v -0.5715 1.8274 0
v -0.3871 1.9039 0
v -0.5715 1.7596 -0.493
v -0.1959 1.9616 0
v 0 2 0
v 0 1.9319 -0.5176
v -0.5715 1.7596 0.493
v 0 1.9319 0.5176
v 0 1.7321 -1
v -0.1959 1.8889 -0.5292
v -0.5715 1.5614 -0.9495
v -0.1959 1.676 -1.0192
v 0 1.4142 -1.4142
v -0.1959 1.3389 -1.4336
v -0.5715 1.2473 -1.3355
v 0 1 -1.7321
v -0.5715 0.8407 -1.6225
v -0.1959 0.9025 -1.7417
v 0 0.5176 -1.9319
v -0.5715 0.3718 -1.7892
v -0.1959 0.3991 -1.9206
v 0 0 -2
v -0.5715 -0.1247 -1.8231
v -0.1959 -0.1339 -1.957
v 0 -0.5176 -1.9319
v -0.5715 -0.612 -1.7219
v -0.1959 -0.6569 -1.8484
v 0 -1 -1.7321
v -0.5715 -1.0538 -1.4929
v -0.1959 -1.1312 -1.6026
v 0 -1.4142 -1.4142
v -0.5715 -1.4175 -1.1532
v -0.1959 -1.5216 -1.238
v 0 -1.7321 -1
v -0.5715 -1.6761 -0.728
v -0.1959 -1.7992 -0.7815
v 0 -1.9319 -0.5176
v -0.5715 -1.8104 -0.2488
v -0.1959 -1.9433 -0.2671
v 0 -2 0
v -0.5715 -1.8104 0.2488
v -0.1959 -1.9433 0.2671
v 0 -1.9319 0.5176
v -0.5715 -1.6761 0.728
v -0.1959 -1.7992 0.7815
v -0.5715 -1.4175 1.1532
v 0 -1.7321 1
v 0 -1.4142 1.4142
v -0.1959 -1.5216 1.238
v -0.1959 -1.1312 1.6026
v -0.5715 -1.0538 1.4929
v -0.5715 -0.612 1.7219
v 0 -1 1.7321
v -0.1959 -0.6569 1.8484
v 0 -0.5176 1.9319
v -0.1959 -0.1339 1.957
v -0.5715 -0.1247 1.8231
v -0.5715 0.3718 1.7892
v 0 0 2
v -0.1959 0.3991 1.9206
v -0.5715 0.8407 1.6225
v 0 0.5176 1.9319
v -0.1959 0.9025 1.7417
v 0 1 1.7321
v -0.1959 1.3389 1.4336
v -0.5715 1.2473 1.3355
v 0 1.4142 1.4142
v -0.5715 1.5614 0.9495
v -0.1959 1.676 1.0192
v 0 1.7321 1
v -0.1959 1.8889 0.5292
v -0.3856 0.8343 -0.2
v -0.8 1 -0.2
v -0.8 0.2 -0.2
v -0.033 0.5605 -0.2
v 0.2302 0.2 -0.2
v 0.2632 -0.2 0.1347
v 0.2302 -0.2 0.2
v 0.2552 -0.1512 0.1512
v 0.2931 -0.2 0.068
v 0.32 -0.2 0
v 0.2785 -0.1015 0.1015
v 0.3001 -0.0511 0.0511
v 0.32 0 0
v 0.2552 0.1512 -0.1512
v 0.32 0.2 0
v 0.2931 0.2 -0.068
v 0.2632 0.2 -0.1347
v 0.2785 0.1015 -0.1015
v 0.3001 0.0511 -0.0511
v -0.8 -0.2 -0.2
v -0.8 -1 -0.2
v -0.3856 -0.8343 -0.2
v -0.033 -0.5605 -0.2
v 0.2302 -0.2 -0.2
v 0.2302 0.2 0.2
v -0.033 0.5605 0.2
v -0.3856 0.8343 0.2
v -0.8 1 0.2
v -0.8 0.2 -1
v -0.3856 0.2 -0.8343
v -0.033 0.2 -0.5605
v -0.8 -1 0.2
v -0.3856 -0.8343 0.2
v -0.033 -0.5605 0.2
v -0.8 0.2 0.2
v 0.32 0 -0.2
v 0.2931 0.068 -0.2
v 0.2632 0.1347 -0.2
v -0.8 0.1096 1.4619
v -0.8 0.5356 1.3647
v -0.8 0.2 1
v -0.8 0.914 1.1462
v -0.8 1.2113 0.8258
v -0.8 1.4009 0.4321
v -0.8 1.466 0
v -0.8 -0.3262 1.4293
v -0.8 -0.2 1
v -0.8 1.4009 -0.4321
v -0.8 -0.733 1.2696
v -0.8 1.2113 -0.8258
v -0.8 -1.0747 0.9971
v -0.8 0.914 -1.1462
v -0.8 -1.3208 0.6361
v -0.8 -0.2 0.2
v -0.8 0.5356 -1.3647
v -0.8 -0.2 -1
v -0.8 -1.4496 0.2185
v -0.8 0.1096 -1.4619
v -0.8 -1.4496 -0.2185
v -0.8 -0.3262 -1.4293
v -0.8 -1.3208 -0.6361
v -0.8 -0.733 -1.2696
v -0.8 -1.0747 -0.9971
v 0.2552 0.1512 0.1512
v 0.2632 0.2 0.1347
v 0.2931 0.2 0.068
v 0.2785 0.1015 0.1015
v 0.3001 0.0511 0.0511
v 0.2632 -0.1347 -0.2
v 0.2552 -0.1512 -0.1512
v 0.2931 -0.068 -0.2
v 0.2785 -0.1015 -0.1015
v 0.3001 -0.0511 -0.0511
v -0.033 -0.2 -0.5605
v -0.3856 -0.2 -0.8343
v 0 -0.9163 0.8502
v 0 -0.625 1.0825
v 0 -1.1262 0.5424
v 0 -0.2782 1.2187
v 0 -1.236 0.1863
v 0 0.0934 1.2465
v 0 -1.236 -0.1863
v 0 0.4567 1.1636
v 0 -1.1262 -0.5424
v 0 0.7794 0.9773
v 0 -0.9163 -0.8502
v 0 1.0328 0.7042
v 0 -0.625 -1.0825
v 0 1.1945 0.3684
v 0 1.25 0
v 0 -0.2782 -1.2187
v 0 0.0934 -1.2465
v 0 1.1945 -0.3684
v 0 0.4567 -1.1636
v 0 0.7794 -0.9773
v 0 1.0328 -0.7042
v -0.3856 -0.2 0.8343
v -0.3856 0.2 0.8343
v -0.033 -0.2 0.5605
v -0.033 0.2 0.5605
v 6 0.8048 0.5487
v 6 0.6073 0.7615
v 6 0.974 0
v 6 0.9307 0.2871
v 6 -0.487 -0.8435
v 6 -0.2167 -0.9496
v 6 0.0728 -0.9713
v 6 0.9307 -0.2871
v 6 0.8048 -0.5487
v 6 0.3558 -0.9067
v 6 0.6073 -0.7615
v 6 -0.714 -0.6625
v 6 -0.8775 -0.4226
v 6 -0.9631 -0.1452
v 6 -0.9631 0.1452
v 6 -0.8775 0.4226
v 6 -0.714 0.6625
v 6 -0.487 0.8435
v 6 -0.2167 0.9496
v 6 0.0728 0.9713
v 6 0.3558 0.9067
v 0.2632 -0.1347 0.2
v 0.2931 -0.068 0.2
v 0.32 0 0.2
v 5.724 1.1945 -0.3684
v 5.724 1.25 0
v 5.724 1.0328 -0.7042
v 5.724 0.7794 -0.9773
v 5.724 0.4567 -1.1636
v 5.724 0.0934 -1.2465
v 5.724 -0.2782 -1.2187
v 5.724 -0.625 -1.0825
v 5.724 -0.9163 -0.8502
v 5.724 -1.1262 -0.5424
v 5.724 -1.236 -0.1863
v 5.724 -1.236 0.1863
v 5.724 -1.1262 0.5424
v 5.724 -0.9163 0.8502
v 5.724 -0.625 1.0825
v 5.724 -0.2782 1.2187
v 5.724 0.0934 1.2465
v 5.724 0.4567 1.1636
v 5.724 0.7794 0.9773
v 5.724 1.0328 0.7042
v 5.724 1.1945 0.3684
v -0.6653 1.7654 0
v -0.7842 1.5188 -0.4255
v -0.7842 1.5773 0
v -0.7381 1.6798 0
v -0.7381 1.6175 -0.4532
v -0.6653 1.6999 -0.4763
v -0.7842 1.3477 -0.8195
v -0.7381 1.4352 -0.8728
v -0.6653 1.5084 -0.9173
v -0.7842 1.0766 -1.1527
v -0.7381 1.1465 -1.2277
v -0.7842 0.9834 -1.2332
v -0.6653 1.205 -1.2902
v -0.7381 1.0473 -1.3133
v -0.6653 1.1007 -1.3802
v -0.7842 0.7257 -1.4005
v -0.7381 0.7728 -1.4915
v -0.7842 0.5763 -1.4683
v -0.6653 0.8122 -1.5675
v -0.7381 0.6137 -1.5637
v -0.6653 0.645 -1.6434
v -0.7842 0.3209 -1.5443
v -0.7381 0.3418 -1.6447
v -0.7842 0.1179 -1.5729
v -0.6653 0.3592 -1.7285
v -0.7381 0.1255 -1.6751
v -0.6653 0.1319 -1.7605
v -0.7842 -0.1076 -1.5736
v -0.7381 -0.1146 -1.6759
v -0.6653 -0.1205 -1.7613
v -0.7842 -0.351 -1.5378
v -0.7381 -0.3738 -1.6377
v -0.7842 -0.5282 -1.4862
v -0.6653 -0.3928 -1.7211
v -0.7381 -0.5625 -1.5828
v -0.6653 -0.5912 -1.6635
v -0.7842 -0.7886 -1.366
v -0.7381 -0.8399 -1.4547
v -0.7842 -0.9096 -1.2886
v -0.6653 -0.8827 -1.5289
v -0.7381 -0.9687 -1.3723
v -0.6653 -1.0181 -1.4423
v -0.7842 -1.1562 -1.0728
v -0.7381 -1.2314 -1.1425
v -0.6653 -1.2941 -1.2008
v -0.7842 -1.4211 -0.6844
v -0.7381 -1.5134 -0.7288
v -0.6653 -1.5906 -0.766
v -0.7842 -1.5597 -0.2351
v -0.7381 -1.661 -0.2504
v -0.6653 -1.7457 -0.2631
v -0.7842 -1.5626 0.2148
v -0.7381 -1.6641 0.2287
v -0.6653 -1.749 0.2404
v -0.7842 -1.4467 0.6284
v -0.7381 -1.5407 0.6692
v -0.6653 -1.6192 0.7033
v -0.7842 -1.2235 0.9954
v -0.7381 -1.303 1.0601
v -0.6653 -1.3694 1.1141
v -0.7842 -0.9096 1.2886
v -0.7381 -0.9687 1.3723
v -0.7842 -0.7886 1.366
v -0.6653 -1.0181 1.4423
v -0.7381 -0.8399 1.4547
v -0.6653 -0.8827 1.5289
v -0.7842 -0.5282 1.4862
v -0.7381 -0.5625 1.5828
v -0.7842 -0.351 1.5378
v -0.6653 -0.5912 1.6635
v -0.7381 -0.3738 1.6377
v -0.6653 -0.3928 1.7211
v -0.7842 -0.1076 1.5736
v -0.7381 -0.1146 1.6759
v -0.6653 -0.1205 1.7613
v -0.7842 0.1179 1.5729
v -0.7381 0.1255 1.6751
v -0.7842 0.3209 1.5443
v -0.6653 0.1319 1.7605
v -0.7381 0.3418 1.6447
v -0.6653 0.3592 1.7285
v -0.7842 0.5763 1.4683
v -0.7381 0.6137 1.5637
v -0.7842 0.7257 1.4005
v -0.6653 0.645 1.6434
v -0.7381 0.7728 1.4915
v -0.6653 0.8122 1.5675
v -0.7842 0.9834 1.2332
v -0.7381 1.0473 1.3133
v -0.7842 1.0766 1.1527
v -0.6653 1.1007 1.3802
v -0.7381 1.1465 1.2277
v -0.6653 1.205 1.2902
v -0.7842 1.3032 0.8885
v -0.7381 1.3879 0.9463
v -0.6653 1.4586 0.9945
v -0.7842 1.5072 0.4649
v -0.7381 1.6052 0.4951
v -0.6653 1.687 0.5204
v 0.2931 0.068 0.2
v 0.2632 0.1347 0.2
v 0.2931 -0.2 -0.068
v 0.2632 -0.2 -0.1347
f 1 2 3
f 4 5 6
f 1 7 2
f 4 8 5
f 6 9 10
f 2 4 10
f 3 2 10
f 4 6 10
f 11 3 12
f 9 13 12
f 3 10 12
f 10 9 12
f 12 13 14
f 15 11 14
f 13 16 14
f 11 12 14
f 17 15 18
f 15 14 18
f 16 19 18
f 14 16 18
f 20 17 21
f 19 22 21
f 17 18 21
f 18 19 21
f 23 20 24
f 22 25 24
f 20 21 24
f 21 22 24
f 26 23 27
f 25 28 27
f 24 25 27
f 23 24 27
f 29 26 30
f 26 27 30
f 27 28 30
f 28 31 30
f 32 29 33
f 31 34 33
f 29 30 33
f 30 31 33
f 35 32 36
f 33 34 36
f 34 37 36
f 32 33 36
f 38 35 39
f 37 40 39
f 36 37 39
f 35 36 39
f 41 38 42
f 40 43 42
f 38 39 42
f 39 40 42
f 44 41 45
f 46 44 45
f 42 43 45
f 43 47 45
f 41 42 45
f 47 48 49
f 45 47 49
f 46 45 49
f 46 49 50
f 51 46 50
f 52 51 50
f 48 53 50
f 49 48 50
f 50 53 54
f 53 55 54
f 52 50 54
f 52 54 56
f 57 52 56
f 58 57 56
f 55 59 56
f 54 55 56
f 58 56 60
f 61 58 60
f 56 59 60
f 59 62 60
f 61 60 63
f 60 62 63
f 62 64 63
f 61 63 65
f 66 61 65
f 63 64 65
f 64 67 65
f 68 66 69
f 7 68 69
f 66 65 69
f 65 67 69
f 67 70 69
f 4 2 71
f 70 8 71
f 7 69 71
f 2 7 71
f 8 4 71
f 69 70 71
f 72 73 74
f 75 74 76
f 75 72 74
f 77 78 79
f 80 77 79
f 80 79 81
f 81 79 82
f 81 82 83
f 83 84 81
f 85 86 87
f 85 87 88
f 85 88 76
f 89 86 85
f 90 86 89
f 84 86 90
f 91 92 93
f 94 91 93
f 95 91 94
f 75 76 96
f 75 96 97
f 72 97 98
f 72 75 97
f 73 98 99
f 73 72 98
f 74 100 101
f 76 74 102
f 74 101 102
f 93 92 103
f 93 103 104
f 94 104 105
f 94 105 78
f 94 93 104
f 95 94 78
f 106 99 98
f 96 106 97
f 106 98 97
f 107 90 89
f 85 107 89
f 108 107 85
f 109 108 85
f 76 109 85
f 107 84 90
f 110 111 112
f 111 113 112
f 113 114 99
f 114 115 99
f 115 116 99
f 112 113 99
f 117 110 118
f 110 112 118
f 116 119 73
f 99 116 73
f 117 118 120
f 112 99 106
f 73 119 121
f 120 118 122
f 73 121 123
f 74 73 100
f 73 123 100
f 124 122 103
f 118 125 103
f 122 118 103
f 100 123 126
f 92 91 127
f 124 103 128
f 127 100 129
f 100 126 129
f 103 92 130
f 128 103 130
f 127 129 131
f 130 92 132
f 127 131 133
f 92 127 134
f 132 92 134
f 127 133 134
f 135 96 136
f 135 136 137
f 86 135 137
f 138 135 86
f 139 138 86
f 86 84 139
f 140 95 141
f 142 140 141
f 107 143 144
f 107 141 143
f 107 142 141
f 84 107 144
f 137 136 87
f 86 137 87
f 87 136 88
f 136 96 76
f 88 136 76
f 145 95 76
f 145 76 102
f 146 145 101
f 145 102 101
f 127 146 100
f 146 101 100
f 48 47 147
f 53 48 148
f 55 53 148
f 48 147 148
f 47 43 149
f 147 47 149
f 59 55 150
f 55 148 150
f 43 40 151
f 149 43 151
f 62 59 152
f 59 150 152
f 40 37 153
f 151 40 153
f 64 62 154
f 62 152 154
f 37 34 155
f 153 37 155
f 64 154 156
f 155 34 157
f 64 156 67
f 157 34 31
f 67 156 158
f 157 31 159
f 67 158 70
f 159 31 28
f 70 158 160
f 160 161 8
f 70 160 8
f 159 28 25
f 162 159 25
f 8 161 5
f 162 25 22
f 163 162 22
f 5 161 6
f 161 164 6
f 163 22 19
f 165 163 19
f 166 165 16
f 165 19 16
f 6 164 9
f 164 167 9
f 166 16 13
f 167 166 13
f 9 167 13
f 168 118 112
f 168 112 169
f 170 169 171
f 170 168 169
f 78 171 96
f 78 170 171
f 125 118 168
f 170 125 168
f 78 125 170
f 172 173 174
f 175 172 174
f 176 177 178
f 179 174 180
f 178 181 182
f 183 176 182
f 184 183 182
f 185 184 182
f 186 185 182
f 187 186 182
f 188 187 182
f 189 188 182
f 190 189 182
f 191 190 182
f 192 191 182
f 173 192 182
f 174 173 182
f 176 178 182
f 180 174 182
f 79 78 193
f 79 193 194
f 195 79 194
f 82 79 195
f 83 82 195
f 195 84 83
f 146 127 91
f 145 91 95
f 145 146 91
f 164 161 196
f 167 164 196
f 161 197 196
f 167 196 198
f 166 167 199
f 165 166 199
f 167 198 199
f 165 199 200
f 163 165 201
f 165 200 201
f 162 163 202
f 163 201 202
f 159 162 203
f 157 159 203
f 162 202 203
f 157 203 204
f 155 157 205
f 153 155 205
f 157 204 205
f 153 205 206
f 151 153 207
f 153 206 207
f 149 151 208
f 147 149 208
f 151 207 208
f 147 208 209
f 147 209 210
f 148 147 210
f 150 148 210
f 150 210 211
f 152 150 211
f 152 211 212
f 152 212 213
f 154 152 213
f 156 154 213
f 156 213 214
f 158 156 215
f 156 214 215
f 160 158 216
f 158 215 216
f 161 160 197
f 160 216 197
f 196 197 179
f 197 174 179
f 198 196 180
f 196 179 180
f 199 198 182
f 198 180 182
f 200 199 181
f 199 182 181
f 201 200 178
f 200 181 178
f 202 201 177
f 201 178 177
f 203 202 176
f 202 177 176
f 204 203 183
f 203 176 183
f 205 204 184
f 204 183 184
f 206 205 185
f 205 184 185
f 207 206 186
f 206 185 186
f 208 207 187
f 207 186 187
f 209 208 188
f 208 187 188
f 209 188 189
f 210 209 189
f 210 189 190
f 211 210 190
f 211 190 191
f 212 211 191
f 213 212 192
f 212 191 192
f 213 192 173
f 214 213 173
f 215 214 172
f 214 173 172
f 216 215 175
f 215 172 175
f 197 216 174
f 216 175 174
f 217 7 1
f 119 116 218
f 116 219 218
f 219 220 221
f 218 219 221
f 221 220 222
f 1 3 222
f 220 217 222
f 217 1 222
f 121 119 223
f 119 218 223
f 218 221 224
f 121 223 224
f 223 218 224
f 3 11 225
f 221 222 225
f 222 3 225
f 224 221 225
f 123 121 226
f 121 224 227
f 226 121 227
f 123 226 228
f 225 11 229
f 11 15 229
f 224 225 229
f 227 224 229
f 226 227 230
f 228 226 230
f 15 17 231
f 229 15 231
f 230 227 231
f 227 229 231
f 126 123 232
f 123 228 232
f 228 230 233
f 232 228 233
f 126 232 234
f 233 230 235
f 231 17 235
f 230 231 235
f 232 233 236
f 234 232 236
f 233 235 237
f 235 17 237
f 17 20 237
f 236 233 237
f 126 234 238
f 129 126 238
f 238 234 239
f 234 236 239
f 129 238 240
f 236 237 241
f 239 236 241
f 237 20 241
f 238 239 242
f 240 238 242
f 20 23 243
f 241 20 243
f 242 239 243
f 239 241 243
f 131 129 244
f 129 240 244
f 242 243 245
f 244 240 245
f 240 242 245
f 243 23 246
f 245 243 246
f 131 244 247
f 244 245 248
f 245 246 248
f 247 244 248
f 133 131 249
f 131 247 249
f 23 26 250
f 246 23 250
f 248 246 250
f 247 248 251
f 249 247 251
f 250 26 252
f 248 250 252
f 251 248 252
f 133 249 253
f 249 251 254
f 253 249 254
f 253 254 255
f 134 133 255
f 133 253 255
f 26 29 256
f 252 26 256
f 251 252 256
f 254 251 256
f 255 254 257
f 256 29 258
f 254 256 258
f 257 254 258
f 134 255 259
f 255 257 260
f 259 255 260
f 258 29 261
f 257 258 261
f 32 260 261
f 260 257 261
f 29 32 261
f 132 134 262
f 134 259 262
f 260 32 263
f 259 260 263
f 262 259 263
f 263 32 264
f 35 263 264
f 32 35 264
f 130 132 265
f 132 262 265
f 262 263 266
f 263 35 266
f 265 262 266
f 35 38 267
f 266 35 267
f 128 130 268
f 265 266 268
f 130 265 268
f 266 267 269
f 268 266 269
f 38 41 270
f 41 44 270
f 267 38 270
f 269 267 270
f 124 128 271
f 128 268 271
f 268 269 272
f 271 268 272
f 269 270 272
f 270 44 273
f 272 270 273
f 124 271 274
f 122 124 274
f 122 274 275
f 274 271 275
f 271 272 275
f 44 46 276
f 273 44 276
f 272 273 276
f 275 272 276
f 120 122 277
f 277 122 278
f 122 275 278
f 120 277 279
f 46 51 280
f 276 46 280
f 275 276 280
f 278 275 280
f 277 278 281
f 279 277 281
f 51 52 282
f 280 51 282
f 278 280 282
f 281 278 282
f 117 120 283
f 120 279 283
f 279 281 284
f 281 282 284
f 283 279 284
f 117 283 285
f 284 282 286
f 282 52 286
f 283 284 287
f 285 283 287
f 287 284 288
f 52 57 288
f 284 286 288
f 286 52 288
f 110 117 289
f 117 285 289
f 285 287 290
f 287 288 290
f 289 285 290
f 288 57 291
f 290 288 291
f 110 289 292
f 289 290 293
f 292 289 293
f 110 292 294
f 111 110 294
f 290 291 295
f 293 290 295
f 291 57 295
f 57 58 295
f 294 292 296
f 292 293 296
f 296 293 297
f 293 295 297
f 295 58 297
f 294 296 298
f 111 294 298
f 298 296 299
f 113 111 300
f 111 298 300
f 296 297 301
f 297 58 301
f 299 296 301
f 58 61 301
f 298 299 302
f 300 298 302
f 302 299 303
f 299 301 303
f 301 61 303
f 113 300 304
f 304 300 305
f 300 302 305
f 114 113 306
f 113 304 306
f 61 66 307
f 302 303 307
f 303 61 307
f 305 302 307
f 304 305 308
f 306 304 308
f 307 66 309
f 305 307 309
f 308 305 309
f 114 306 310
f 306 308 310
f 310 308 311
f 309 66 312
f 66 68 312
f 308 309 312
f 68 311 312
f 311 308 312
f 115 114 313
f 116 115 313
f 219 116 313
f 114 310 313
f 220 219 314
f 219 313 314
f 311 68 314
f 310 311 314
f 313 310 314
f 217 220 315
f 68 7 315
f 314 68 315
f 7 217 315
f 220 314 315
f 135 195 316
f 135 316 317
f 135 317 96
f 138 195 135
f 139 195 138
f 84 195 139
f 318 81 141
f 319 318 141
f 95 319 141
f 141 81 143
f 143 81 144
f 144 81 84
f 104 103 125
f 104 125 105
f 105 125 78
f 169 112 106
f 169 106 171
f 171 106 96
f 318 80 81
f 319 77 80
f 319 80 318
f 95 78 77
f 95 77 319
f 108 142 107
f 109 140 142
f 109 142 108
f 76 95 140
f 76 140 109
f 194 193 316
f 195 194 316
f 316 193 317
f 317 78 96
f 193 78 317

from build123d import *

# Parameters (mm, degrees)
CUT_EXTRUDE1_DEPTH      = 0.2
CUT_EXTRUDE1_DEPTH_BACK = 0.2
CUT_EXTRUDE2_DEPTH      = 0.2
CUT_EXTRUDE2_DEPTH_BACK = 0.2


with BuildPart() as part:
    # Sketch1 → Revolve1 (revolve)
    with BuildSketch(Plane.XY):
        with BuildLine():
            Line((-0.8, 0), (-0.8, 1.46601855))
            ThreePointArc((-0.8, 1.46601855), (-0.738085774, 1.679789478), (-0.571509952, 1.827383098))
            ThreePointArc((-0.571509952, 1.827383098), (-0.29223212, 1.93513645), (0, 2))
            Line((0, 2), (0, 1.25))
            Line((0, 1.25), (5.724, 1.25))
            Line((5.724, 1.25), (6, 0.974))
            Line((6, 0.974), (6, 0))
            Line((6, 0), (-0.8, 0))
        make_face()
    revolve(axis=Axis((6, 0, 0), (-1, 0, 0)))

    # Sketch2 → Cut-Extrude1 (cut, two sides: drawn at the far end of the back side and taken through both)
    with BuildSketch(Plane.XY.offset(-CUT_EXTRUDE1_DEPTH_BACK)):
        with BuildLine():
            Line((-0.8, 1), (-0.8, -1))
            ThreePointArc((-0.8, -1), (-0.115415221, -0.639534952), (0.32, 0))
            ThreePointArc((0.32, 0), (-0.115415221, 0.639534952), (-0.8, 1))
        make_face()
    extrude(amount=CUT_EXTRUDE1_DEPTH + CUT_EXTRUDE1_DEPTH_BACK, mode=Mode.SUBTRACT)

    # Sketch3 → Cut-Extrude2 (cut, two sides: drawn at the far end of the back side and taken through both)
    with BuildSketch(Plane(origin=(0, 0, 0), x_dir=(1, 0, 0), z_dir=(0, 1, 0)).offset(-CUT_EXTRUDE2_DEPTH_BACK)):
        with BuildLine():
            Line((-0.8, 1), (-0.8, -1))
            ThreePointArc((-0.8, -1), (-0.115415221, -0.639534952), (0.32, 0))
            ThreePointArc((0.32, 0), (-0.115415221, 0.639534952), (-0.8, 1))
        make_face()
    extrude(amount=CUT_EXTRUDE2_DEPTH + CUT_EXTRUDE2_DEPTH_BACK, mode=Mode.SUBTRACT)


solid = part.part
